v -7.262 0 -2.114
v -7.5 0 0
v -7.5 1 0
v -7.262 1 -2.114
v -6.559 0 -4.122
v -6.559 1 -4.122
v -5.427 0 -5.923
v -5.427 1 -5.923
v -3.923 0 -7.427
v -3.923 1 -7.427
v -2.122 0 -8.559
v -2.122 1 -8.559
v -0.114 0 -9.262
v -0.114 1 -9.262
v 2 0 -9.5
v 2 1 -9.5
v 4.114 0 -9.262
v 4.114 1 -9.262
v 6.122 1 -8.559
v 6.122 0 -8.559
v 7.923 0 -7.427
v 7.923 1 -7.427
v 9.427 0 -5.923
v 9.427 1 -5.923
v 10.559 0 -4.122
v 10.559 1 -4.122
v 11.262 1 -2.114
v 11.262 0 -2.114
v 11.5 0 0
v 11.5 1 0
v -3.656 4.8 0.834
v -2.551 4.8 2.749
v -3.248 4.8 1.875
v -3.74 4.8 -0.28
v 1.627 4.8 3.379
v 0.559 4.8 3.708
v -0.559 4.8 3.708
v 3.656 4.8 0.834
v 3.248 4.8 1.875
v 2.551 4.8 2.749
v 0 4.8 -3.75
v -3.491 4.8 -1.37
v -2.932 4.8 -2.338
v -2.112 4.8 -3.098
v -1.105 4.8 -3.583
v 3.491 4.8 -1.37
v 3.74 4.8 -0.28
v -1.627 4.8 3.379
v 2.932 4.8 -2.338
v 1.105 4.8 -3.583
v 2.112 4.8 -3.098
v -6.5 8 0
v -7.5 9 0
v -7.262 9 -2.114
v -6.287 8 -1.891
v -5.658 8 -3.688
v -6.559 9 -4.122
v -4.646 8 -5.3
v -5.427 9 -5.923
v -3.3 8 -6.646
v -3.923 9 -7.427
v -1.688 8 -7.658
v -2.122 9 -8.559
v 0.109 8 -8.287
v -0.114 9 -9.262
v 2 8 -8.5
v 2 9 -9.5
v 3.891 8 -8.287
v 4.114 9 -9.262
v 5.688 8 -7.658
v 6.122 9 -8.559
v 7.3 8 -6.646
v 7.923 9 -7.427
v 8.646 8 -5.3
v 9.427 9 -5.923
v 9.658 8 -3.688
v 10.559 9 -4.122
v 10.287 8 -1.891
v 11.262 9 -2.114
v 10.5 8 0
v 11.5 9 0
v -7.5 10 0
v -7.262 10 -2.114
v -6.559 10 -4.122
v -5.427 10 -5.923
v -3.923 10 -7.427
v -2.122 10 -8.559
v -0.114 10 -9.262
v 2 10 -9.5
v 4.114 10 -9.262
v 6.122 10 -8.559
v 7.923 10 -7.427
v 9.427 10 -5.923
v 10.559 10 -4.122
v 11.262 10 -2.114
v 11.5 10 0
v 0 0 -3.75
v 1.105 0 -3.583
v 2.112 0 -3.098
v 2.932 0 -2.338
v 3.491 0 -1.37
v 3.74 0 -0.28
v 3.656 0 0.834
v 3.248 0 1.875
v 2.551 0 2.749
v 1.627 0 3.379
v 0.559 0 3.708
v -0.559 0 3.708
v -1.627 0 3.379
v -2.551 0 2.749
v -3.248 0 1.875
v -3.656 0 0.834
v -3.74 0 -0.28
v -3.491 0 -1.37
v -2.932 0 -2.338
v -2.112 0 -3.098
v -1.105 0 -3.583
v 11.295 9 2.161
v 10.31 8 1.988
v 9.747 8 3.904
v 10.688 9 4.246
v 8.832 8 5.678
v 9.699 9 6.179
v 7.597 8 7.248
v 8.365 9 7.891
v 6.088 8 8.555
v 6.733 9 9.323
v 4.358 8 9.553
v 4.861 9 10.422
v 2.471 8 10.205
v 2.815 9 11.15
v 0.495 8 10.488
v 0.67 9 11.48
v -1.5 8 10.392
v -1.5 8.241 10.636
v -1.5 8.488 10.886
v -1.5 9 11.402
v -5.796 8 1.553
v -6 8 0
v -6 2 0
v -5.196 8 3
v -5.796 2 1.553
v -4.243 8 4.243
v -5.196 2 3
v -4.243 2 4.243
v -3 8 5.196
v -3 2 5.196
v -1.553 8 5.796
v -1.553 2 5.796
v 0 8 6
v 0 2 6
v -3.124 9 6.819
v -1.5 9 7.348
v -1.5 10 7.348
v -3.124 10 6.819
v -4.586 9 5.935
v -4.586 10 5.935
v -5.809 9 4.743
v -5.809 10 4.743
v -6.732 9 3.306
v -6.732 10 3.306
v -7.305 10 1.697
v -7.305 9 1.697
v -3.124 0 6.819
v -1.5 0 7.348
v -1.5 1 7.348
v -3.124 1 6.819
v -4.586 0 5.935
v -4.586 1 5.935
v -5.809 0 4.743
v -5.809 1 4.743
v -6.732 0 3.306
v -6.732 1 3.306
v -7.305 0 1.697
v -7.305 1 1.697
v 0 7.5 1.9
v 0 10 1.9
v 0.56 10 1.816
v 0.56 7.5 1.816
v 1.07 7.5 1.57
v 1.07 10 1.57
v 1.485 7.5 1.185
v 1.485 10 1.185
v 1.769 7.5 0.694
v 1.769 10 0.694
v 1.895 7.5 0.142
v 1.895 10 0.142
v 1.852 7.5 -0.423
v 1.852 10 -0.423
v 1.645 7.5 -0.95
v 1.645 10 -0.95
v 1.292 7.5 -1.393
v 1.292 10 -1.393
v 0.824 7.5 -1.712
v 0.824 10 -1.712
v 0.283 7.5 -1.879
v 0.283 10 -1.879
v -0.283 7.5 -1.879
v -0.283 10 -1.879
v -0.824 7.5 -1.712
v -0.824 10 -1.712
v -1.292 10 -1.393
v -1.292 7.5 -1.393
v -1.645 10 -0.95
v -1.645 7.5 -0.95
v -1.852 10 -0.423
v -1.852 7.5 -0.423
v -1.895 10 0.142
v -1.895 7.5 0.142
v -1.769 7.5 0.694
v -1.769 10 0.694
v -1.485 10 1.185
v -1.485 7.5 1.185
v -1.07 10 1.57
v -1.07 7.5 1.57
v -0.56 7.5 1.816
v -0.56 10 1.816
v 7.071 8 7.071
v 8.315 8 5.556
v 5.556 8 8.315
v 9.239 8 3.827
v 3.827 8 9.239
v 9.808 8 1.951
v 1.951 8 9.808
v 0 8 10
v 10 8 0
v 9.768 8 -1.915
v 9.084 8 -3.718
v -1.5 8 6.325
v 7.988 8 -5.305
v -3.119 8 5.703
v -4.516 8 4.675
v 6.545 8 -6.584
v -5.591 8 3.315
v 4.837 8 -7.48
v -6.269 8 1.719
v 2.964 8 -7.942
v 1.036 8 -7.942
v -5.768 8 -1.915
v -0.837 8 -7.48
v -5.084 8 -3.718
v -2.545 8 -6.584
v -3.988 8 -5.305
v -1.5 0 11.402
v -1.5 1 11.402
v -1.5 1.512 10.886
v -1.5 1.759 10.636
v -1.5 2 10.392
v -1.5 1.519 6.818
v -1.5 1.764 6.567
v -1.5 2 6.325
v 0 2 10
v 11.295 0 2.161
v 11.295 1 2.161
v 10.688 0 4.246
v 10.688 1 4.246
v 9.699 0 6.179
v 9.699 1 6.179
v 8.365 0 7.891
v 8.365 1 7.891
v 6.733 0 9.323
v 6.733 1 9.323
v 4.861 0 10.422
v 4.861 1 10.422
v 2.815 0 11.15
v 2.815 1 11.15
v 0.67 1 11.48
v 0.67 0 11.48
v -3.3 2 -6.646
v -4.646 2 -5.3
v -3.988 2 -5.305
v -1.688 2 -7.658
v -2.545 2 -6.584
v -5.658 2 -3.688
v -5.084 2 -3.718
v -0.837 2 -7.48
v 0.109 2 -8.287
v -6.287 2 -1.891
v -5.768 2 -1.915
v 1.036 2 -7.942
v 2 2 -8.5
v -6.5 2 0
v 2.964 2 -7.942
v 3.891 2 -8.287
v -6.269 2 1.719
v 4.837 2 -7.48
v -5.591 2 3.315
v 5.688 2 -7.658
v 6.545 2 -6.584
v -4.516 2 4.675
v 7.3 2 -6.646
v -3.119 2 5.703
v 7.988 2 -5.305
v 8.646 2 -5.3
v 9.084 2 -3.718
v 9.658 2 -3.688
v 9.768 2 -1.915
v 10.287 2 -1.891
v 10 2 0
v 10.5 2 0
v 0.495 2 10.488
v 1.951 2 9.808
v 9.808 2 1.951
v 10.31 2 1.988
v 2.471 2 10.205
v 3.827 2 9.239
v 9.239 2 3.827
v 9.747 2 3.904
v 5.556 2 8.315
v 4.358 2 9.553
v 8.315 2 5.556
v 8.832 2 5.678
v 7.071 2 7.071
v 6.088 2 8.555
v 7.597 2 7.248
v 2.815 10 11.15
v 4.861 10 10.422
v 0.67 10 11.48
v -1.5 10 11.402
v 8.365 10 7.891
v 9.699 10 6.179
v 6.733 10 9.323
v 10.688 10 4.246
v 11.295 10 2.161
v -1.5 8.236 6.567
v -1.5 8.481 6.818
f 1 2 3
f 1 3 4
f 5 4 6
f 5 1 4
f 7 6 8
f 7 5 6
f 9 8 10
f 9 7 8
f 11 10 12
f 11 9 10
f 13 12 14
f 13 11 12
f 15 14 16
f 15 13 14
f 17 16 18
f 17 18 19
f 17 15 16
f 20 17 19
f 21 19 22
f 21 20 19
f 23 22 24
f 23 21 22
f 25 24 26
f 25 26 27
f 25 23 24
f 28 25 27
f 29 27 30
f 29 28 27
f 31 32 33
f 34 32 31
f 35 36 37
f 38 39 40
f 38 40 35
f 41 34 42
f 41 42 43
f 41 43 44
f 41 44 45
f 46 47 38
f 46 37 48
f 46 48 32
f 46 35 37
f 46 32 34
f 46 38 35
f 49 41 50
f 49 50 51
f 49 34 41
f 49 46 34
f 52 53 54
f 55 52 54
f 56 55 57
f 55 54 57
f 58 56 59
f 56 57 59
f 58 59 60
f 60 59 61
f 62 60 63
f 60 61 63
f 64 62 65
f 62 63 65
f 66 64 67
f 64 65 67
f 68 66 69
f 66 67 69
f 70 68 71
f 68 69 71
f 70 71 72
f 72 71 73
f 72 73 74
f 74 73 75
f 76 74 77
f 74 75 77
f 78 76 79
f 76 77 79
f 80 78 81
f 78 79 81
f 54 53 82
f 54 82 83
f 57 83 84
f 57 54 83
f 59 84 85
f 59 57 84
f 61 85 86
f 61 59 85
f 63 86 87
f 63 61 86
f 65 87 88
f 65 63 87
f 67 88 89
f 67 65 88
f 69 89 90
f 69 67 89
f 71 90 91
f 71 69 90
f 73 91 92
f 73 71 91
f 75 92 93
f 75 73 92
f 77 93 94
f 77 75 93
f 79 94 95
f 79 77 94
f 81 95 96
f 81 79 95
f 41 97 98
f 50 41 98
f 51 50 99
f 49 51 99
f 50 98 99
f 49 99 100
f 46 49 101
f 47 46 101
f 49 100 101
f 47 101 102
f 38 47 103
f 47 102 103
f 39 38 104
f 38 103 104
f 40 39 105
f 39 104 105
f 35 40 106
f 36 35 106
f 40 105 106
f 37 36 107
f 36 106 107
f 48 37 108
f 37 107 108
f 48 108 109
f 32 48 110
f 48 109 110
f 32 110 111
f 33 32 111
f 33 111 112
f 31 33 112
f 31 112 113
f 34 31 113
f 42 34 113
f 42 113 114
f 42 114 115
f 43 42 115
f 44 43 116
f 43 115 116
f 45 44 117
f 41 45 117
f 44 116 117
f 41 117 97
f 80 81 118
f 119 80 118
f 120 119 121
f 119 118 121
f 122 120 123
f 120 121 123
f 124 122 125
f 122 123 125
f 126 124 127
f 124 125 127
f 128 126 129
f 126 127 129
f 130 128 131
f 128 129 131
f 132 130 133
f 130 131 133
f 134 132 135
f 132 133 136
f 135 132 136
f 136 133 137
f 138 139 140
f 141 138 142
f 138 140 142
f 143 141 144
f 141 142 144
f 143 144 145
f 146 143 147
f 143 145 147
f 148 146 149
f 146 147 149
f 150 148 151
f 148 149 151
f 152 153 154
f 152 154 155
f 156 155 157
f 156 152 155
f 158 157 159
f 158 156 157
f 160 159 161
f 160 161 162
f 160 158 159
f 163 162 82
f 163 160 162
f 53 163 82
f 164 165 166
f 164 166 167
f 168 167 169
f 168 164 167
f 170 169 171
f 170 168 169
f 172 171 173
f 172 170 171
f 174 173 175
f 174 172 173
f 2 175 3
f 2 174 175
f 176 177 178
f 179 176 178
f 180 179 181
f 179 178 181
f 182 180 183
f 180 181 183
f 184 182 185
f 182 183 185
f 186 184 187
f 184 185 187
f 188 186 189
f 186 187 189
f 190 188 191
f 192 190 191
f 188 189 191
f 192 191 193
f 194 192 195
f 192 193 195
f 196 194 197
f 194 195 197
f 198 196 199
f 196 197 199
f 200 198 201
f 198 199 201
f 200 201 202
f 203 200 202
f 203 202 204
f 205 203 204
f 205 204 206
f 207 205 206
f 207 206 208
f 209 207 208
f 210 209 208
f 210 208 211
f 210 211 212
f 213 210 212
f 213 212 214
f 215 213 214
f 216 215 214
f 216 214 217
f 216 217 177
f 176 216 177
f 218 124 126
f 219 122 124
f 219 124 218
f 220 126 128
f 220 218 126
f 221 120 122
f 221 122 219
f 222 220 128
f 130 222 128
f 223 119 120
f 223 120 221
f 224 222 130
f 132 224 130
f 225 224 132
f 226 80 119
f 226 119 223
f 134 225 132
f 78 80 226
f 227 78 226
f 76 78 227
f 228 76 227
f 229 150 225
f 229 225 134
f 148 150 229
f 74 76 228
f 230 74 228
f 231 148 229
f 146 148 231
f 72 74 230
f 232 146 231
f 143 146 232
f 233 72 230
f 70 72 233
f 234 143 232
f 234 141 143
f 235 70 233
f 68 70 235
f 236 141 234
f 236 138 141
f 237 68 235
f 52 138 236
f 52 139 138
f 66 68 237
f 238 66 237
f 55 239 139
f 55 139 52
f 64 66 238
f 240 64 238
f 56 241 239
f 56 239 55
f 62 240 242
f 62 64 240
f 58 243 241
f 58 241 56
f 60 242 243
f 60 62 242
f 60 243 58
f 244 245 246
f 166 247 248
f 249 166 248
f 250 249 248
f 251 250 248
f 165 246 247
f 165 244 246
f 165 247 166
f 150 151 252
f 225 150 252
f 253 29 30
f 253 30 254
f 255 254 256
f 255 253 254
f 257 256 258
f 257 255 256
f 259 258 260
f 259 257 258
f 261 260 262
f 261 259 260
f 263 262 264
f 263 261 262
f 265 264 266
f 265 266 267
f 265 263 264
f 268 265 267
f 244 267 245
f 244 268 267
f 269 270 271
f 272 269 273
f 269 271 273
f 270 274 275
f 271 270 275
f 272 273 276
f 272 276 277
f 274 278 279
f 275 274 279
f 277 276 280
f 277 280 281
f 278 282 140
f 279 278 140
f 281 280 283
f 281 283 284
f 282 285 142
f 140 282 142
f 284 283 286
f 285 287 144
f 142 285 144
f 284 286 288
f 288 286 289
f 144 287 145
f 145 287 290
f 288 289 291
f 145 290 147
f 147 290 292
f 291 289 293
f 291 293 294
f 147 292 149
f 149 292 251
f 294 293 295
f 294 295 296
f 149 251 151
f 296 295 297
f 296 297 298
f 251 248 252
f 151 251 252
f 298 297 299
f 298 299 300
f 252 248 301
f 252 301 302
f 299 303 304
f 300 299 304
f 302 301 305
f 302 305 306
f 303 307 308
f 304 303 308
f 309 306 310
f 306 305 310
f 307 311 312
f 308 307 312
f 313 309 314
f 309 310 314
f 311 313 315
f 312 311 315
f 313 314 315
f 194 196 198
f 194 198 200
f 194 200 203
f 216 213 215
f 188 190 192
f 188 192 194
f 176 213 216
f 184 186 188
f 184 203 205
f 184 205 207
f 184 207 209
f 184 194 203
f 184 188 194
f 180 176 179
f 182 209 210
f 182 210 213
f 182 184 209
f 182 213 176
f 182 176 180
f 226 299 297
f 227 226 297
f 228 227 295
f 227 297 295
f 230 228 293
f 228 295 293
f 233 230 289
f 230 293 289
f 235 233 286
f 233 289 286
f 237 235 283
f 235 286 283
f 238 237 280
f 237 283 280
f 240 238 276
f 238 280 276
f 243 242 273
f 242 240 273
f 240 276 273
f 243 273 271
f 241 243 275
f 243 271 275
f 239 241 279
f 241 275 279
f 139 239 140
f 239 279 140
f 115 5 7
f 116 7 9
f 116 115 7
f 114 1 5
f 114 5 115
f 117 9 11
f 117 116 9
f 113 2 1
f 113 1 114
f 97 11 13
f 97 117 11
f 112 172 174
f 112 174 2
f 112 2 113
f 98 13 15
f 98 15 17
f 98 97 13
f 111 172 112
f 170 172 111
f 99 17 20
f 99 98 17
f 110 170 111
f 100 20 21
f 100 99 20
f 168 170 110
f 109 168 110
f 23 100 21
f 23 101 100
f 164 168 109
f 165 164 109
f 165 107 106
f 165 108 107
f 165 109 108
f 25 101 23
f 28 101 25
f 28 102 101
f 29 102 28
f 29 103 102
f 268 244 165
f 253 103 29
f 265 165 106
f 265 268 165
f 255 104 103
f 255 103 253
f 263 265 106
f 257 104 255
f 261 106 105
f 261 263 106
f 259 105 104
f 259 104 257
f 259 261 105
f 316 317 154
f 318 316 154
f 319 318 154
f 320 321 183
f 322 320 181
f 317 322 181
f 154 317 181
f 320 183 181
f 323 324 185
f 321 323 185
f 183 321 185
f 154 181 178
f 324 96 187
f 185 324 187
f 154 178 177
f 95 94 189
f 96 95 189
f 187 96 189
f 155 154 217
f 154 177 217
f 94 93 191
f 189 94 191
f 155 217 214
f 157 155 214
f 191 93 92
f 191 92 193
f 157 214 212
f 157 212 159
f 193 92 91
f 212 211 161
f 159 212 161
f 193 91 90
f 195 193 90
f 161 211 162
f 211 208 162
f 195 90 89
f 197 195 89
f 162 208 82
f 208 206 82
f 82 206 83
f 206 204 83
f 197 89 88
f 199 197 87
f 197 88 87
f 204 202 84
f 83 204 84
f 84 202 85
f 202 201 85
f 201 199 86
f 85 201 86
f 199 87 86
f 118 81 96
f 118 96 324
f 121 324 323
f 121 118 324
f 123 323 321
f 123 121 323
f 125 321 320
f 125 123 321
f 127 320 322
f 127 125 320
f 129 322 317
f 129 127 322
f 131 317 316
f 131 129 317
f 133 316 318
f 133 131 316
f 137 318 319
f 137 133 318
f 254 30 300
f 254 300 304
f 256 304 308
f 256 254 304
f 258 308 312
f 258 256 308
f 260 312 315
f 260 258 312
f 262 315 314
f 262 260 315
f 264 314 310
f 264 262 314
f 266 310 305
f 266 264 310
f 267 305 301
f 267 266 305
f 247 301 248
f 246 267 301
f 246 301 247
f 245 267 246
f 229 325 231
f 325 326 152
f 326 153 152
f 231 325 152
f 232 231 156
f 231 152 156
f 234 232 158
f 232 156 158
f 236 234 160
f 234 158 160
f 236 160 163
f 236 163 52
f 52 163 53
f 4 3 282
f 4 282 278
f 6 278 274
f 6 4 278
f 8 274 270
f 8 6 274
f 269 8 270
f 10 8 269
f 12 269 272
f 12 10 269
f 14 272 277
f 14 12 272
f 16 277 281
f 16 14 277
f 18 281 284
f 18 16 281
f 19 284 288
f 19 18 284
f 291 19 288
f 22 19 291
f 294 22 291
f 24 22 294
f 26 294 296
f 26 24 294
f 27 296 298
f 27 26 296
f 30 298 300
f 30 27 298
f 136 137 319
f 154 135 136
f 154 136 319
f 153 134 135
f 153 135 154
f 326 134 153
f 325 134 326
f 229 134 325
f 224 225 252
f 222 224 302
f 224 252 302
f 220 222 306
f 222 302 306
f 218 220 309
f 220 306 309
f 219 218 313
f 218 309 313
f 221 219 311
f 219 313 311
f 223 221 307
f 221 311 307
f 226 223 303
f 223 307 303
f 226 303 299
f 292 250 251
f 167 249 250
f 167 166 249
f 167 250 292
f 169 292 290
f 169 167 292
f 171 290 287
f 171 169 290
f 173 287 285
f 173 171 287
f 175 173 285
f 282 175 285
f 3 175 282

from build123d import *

# Parameters (mm, degrees)
SKETCH1_R           = 6
BOSS_EXTRUDE1_DEPTH = 10
SKETCH2_R           = 1.9
CUT_EXTRUDE1_DEPTH  = 2.5
SKETCH3_R           = 3.75
CUT_EXTRUDE2_DEPTH  = 4.8
BOSS_EXTRUDE2_DEPTH = 10
BOSS_EXTRUDE3_DEPTH = 2
BOSS_EXTRUDE5_START = -2
SKETCH9_R           = 1.9
BOSS_EXTRUDE5_DEPTH = 2
CHAMFER1_SIZE       = 1


with BuildPart() as part:
    # Sketch1 → Boss-Extrude1 (new body)
    with BuildSketch(Plane(origin=(0, 0, 0), x_dir=(1, 0, 0), z_dir=(0, 1, 0))):
        with Locations(Location((0, 0, 0), (0, 0, 270))):
            Circle(SKETCH1_R)
    extrude(amount=BOSS_EXTRUDE1_DEPTH)

    # Sketch2 → Cut-Extrude1 (cut)
    with BuildSketch(Plane(origin=(0, 10, 0), x_dir=(1, 0, 0), z_dir=(0, 1, 0))):
        with Locations(Location((0, 0, 0), (0, 0, 270))):
            Circle(SKETCH2_R)
    extrude(amount=-CUT_EXTRUDE1_DEPTH, mode=Mode.SUBTRACT)

    # Sketch3 → Cut-Extrude2 (cut)
    with BuildSketch(Plane.XZ):
        with Locations(Location((0, 0, 0), (0, 0, 270))):
            Circle(SKETCH3_R)
    extrude(amount=-CUT_EXTRUDE2_DEPTH, mode=Mode.SUBTRACT)

    # Sketch5 → Boss-Extrude2 (add)
    with BuildSketch(Plane.XZ):
        with BuildLine():
            Line((0, 6), (0, 10))
            ThreePointArc((0, 10), (7.071067812, 7.071067812), (10, 0))
            ThreePointArc((10, 0), (2, -8), (-6, 0))
            ThreePointArc((-6, 0), (4.242640687, -4.242640687), (0, 6))
        make_face()
    extrude(amount=-BOSS_EXTRUDE2_DEPTH)

    # Sketch7 → Boss-Extrude3 (add)
    with BuildSketch(Plane.XZ):
        with BuildLine():
            Line((-1.5, 11.401754251), (-1.5, 7.348469228))
            ThreePointArc((-1.5, 7.348469228), (-5.809475019, 4.74341649), (-7.5, 0))
            ThreePointArc((-7.5, 0), (2, -9.5), (11.5, 0))
            ThreePointArc((11.5, 0), (7.582875444, 8.645808233), (-1.5, 11.401754251))
        make_face()
        with BuildLine():
            Line((0, 10), (0, 6))
            ThreePointArc((0, 6), (-4.242640687, 4.242640687), (-6, 0))
            ThreePointArc((-6, 0), (2, -8), (10, 0))
            ThreePointArc((10, 0), (7.071067812, 7.071067812), (0, 10))
        make_face(mode=Mode.SUBTRACT)
    extrude(amount=-BOSS_EXTRUDE3_DEPTH)

    # Sketch9 → Boss-Extrude5 (add)
    with BuildSketch(Plane(origin=(0, 10, 0), x_dir=(1, 0, 0), z_dir=(0, 1, 0)).offset(BOSS_EXTRUDE5_START)):
        with BuildLine():
            Line((-1.5, -11.401754251), (-1.5, -7.348469228))
            ThreePointArc((-1.5, -7.348469228), (-5.809475019, -4.74341649), (-7.5, 0))
            ThreePointArc((-7.5, 0), (2, 9.5), (11.5, 0))
            ThreePointArc((11.5, 0), (7.582875444, -8.645808233), (-1.5, -11.401754251))
        make_face()
        with Locations(Location((0, 0, 0), (0, 0, 270))):
            Circle(SKETCH9_R, mode=Mode.SUBTRACT)
    extrude(amount=BOSS_EXTRUDE5_DEPTH)

    # Chamfer1
    chamfer1_edges = [part.edges().sort_by_distance(p)[0] for p in [
        (7.582875444, 2, 8.645808233),
        (2, 2, -9.5),
        (-5.809475019, 2, 4.74341649),
        (-5.809475019, 8, 4.74341649),
        (2, 8, -9.5),
        (7.582875444, 8, 8.645808233),
    ]]
    chamfer(chamfer1_edges, length=CHAMFER1_SIZE)


solid = part.part
